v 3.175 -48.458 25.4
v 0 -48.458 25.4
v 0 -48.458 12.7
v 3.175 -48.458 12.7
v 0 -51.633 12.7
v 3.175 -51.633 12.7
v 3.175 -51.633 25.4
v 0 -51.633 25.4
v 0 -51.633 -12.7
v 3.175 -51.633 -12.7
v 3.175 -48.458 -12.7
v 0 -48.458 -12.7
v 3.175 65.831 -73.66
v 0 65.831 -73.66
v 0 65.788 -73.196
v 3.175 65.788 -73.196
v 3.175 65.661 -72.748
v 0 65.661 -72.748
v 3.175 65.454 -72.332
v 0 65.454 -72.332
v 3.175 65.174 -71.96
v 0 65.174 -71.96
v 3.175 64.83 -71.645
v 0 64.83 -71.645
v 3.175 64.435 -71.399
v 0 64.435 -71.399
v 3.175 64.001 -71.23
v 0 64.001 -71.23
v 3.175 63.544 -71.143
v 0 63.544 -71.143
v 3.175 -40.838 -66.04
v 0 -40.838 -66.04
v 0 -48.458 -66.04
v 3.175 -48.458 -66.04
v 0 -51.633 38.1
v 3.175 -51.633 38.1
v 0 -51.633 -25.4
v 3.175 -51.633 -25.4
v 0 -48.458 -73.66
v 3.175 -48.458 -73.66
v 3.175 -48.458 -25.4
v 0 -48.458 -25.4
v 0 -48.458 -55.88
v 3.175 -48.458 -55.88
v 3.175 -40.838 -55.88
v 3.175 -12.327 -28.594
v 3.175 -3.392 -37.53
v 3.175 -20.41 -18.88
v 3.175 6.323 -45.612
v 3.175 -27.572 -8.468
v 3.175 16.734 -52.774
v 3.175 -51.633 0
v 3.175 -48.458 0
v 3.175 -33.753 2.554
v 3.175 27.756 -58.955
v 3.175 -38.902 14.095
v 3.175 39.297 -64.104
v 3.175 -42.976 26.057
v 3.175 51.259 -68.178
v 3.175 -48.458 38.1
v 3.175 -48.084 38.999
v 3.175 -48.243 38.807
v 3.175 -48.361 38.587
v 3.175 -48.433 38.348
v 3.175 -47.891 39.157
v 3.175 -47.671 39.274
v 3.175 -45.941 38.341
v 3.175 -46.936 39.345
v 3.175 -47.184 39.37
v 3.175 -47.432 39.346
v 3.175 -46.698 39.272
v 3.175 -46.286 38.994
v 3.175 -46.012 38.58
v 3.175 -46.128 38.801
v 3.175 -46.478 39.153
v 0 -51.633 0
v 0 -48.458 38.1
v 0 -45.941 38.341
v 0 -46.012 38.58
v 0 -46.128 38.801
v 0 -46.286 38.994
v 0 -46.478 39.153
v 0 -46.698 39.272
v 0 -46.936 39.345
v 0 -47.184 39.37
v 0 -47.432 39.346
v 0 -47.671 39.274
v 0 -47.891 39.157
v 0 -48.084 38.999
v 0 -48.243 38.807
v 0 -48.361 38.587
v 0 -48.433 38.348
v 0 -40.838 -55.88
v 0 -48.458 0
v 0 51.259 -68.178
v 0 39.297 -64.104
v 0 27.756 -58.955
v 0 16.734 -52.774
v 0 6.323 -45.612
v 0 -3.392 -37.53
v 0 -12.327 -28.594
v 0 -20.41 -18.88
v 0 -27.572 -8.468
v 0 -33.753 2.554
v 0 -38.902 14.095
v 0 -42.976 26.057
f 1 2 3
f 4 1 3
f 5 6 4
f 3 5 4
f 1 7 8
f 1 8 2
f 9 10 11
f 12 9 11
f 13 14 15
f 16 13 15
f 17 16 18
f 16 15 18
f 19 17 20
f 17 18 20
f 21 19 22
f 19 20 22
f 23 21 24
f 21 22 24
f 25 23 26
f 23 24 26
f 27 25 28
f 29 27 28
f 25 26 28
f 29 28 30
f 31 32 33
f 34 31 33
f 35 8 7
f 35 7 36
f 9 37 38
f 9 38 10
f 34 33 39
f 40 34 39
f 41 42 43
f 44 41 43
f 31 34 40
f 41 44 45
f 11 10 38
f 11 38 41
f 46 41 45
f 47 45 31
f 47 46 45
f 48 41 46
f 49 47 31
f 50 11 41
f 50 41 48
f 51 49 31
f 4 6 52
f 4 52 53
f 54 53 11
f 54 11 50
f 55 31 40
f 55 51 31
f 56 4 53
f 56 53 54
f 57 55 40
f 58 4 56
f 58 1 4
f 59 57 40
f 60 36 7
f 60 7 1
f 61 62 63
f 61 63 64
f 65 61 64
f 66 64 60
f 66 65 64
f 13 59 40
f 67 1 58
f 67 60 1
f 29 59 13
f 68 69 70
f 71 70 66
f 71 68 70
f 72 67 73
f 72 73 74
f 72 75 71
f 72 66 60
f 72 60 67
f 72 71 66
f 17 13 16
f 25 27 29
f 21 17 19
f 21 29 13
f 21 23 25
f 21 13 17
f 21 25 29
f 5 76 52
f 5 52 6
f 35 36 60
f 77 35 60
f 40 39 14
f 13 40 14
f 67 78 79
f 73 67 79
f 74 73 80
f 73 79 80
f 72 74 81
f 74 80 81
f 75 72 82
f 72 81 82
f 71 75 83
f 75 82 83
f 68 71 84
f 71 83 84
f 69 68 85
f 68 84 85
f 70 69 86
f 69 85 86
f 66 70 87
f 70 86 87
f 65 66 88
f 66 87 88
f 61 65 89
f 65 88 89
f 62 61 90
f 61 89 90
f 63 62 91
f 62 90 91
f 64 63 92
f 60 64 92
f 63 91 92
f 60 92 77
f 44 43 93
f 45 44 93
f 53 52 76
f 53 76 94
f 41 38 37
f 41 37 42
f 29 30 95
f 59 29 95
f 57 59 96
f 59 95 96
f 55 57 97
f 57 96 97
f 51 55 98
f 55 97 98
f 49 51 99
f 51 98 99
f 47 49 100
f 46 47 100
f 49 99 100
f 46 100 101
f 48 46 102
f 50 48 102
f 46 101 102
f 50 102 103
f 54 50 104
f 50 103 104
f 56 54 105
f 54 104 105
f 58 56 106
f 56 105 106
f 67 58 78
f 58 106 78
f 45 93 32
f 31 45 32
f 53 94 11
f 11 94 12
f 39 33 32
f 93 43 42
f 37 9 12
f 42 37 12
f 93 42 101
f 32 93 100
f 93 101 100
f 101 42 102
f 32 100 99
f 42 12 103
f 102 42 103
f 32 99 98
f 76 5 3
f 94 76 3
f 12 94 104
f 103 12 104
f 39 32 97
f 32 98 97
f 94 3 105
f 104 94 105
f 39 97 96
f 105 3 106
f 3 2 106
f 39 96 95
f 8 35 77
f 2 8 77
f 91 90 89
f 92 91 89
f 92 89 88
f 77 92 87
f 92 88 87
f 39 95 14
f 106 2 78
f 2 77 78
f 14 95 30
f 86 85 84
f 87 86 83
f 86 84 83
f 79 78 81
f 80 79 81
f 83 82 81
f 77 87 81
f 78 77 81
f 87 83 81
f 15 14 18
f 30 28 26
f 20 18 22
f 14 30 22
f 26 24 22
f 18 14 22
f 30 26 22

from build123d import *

# Parameters (mm, degrees)
F0_W     = 3.175
F0_H     = 12.7
F1_DEPTH = 3.175


with BuildPart() as f1:
    # F0 (on Right) → F1 (new body)
    with BuildSketch(Plane.YZ):
        with BuildLine():
            ThreePointArc((-45.94075, 38.34122), (-47.308793, 39.364207), (-48.457631, 38.1))
            Line((-48.457631, 38.1), (-48.457631, 25.4))
            Line((-48.457631, 25.4), (-48.457631, 12.7))
            Line((-48.457631, 12.7), (-48.457631, 0))
            Line((-48.457631, 0), (-48.457631, -12.7))
            Line((-48.457631, -12.7), (-48.457631, -25.4))
            Line((-48.457631, -25.4), (-48.457631, -55.88))
            Line((-48.457631, -55.88), (-40.837631, -55.88))
            Line((-40.837631, -55.88), (-40.837631, -66.04))
            Line((-40.837631, -66.04), (-48.457631, -66.04))
            Line((-48.457631, -66.04), (-48.457631, -73.66))
            Line((-48.457631, -73.66), (-40.837631, -73.66))
            Line((-40.837631, -73.66), (63.302369, -73.66))
            Line((63.302369, -73.66), (65.830783, -73.66))
            ThreePointArc((65.830783, -73.66), (65.17357, -71.959562), (63.543589, -71.143119))
            ThreePointArc((63.543589, -71.143119), (-7.961537, -33.163906), (-45.94075, 38.34122))
        make_face()
        with Locations((-50.045131, 31.75)):
            Rectangle(F0_W, F0_H)
        with Locations((-50.045131, 6.35)):
            Rectangle(F0_W, F0_H)
        with Locations((-50.045131, -19.05)):
            Rectangle(F0_W, F0_H)
    extrude(amount=F1_DEPTH)


solid = f1.part
